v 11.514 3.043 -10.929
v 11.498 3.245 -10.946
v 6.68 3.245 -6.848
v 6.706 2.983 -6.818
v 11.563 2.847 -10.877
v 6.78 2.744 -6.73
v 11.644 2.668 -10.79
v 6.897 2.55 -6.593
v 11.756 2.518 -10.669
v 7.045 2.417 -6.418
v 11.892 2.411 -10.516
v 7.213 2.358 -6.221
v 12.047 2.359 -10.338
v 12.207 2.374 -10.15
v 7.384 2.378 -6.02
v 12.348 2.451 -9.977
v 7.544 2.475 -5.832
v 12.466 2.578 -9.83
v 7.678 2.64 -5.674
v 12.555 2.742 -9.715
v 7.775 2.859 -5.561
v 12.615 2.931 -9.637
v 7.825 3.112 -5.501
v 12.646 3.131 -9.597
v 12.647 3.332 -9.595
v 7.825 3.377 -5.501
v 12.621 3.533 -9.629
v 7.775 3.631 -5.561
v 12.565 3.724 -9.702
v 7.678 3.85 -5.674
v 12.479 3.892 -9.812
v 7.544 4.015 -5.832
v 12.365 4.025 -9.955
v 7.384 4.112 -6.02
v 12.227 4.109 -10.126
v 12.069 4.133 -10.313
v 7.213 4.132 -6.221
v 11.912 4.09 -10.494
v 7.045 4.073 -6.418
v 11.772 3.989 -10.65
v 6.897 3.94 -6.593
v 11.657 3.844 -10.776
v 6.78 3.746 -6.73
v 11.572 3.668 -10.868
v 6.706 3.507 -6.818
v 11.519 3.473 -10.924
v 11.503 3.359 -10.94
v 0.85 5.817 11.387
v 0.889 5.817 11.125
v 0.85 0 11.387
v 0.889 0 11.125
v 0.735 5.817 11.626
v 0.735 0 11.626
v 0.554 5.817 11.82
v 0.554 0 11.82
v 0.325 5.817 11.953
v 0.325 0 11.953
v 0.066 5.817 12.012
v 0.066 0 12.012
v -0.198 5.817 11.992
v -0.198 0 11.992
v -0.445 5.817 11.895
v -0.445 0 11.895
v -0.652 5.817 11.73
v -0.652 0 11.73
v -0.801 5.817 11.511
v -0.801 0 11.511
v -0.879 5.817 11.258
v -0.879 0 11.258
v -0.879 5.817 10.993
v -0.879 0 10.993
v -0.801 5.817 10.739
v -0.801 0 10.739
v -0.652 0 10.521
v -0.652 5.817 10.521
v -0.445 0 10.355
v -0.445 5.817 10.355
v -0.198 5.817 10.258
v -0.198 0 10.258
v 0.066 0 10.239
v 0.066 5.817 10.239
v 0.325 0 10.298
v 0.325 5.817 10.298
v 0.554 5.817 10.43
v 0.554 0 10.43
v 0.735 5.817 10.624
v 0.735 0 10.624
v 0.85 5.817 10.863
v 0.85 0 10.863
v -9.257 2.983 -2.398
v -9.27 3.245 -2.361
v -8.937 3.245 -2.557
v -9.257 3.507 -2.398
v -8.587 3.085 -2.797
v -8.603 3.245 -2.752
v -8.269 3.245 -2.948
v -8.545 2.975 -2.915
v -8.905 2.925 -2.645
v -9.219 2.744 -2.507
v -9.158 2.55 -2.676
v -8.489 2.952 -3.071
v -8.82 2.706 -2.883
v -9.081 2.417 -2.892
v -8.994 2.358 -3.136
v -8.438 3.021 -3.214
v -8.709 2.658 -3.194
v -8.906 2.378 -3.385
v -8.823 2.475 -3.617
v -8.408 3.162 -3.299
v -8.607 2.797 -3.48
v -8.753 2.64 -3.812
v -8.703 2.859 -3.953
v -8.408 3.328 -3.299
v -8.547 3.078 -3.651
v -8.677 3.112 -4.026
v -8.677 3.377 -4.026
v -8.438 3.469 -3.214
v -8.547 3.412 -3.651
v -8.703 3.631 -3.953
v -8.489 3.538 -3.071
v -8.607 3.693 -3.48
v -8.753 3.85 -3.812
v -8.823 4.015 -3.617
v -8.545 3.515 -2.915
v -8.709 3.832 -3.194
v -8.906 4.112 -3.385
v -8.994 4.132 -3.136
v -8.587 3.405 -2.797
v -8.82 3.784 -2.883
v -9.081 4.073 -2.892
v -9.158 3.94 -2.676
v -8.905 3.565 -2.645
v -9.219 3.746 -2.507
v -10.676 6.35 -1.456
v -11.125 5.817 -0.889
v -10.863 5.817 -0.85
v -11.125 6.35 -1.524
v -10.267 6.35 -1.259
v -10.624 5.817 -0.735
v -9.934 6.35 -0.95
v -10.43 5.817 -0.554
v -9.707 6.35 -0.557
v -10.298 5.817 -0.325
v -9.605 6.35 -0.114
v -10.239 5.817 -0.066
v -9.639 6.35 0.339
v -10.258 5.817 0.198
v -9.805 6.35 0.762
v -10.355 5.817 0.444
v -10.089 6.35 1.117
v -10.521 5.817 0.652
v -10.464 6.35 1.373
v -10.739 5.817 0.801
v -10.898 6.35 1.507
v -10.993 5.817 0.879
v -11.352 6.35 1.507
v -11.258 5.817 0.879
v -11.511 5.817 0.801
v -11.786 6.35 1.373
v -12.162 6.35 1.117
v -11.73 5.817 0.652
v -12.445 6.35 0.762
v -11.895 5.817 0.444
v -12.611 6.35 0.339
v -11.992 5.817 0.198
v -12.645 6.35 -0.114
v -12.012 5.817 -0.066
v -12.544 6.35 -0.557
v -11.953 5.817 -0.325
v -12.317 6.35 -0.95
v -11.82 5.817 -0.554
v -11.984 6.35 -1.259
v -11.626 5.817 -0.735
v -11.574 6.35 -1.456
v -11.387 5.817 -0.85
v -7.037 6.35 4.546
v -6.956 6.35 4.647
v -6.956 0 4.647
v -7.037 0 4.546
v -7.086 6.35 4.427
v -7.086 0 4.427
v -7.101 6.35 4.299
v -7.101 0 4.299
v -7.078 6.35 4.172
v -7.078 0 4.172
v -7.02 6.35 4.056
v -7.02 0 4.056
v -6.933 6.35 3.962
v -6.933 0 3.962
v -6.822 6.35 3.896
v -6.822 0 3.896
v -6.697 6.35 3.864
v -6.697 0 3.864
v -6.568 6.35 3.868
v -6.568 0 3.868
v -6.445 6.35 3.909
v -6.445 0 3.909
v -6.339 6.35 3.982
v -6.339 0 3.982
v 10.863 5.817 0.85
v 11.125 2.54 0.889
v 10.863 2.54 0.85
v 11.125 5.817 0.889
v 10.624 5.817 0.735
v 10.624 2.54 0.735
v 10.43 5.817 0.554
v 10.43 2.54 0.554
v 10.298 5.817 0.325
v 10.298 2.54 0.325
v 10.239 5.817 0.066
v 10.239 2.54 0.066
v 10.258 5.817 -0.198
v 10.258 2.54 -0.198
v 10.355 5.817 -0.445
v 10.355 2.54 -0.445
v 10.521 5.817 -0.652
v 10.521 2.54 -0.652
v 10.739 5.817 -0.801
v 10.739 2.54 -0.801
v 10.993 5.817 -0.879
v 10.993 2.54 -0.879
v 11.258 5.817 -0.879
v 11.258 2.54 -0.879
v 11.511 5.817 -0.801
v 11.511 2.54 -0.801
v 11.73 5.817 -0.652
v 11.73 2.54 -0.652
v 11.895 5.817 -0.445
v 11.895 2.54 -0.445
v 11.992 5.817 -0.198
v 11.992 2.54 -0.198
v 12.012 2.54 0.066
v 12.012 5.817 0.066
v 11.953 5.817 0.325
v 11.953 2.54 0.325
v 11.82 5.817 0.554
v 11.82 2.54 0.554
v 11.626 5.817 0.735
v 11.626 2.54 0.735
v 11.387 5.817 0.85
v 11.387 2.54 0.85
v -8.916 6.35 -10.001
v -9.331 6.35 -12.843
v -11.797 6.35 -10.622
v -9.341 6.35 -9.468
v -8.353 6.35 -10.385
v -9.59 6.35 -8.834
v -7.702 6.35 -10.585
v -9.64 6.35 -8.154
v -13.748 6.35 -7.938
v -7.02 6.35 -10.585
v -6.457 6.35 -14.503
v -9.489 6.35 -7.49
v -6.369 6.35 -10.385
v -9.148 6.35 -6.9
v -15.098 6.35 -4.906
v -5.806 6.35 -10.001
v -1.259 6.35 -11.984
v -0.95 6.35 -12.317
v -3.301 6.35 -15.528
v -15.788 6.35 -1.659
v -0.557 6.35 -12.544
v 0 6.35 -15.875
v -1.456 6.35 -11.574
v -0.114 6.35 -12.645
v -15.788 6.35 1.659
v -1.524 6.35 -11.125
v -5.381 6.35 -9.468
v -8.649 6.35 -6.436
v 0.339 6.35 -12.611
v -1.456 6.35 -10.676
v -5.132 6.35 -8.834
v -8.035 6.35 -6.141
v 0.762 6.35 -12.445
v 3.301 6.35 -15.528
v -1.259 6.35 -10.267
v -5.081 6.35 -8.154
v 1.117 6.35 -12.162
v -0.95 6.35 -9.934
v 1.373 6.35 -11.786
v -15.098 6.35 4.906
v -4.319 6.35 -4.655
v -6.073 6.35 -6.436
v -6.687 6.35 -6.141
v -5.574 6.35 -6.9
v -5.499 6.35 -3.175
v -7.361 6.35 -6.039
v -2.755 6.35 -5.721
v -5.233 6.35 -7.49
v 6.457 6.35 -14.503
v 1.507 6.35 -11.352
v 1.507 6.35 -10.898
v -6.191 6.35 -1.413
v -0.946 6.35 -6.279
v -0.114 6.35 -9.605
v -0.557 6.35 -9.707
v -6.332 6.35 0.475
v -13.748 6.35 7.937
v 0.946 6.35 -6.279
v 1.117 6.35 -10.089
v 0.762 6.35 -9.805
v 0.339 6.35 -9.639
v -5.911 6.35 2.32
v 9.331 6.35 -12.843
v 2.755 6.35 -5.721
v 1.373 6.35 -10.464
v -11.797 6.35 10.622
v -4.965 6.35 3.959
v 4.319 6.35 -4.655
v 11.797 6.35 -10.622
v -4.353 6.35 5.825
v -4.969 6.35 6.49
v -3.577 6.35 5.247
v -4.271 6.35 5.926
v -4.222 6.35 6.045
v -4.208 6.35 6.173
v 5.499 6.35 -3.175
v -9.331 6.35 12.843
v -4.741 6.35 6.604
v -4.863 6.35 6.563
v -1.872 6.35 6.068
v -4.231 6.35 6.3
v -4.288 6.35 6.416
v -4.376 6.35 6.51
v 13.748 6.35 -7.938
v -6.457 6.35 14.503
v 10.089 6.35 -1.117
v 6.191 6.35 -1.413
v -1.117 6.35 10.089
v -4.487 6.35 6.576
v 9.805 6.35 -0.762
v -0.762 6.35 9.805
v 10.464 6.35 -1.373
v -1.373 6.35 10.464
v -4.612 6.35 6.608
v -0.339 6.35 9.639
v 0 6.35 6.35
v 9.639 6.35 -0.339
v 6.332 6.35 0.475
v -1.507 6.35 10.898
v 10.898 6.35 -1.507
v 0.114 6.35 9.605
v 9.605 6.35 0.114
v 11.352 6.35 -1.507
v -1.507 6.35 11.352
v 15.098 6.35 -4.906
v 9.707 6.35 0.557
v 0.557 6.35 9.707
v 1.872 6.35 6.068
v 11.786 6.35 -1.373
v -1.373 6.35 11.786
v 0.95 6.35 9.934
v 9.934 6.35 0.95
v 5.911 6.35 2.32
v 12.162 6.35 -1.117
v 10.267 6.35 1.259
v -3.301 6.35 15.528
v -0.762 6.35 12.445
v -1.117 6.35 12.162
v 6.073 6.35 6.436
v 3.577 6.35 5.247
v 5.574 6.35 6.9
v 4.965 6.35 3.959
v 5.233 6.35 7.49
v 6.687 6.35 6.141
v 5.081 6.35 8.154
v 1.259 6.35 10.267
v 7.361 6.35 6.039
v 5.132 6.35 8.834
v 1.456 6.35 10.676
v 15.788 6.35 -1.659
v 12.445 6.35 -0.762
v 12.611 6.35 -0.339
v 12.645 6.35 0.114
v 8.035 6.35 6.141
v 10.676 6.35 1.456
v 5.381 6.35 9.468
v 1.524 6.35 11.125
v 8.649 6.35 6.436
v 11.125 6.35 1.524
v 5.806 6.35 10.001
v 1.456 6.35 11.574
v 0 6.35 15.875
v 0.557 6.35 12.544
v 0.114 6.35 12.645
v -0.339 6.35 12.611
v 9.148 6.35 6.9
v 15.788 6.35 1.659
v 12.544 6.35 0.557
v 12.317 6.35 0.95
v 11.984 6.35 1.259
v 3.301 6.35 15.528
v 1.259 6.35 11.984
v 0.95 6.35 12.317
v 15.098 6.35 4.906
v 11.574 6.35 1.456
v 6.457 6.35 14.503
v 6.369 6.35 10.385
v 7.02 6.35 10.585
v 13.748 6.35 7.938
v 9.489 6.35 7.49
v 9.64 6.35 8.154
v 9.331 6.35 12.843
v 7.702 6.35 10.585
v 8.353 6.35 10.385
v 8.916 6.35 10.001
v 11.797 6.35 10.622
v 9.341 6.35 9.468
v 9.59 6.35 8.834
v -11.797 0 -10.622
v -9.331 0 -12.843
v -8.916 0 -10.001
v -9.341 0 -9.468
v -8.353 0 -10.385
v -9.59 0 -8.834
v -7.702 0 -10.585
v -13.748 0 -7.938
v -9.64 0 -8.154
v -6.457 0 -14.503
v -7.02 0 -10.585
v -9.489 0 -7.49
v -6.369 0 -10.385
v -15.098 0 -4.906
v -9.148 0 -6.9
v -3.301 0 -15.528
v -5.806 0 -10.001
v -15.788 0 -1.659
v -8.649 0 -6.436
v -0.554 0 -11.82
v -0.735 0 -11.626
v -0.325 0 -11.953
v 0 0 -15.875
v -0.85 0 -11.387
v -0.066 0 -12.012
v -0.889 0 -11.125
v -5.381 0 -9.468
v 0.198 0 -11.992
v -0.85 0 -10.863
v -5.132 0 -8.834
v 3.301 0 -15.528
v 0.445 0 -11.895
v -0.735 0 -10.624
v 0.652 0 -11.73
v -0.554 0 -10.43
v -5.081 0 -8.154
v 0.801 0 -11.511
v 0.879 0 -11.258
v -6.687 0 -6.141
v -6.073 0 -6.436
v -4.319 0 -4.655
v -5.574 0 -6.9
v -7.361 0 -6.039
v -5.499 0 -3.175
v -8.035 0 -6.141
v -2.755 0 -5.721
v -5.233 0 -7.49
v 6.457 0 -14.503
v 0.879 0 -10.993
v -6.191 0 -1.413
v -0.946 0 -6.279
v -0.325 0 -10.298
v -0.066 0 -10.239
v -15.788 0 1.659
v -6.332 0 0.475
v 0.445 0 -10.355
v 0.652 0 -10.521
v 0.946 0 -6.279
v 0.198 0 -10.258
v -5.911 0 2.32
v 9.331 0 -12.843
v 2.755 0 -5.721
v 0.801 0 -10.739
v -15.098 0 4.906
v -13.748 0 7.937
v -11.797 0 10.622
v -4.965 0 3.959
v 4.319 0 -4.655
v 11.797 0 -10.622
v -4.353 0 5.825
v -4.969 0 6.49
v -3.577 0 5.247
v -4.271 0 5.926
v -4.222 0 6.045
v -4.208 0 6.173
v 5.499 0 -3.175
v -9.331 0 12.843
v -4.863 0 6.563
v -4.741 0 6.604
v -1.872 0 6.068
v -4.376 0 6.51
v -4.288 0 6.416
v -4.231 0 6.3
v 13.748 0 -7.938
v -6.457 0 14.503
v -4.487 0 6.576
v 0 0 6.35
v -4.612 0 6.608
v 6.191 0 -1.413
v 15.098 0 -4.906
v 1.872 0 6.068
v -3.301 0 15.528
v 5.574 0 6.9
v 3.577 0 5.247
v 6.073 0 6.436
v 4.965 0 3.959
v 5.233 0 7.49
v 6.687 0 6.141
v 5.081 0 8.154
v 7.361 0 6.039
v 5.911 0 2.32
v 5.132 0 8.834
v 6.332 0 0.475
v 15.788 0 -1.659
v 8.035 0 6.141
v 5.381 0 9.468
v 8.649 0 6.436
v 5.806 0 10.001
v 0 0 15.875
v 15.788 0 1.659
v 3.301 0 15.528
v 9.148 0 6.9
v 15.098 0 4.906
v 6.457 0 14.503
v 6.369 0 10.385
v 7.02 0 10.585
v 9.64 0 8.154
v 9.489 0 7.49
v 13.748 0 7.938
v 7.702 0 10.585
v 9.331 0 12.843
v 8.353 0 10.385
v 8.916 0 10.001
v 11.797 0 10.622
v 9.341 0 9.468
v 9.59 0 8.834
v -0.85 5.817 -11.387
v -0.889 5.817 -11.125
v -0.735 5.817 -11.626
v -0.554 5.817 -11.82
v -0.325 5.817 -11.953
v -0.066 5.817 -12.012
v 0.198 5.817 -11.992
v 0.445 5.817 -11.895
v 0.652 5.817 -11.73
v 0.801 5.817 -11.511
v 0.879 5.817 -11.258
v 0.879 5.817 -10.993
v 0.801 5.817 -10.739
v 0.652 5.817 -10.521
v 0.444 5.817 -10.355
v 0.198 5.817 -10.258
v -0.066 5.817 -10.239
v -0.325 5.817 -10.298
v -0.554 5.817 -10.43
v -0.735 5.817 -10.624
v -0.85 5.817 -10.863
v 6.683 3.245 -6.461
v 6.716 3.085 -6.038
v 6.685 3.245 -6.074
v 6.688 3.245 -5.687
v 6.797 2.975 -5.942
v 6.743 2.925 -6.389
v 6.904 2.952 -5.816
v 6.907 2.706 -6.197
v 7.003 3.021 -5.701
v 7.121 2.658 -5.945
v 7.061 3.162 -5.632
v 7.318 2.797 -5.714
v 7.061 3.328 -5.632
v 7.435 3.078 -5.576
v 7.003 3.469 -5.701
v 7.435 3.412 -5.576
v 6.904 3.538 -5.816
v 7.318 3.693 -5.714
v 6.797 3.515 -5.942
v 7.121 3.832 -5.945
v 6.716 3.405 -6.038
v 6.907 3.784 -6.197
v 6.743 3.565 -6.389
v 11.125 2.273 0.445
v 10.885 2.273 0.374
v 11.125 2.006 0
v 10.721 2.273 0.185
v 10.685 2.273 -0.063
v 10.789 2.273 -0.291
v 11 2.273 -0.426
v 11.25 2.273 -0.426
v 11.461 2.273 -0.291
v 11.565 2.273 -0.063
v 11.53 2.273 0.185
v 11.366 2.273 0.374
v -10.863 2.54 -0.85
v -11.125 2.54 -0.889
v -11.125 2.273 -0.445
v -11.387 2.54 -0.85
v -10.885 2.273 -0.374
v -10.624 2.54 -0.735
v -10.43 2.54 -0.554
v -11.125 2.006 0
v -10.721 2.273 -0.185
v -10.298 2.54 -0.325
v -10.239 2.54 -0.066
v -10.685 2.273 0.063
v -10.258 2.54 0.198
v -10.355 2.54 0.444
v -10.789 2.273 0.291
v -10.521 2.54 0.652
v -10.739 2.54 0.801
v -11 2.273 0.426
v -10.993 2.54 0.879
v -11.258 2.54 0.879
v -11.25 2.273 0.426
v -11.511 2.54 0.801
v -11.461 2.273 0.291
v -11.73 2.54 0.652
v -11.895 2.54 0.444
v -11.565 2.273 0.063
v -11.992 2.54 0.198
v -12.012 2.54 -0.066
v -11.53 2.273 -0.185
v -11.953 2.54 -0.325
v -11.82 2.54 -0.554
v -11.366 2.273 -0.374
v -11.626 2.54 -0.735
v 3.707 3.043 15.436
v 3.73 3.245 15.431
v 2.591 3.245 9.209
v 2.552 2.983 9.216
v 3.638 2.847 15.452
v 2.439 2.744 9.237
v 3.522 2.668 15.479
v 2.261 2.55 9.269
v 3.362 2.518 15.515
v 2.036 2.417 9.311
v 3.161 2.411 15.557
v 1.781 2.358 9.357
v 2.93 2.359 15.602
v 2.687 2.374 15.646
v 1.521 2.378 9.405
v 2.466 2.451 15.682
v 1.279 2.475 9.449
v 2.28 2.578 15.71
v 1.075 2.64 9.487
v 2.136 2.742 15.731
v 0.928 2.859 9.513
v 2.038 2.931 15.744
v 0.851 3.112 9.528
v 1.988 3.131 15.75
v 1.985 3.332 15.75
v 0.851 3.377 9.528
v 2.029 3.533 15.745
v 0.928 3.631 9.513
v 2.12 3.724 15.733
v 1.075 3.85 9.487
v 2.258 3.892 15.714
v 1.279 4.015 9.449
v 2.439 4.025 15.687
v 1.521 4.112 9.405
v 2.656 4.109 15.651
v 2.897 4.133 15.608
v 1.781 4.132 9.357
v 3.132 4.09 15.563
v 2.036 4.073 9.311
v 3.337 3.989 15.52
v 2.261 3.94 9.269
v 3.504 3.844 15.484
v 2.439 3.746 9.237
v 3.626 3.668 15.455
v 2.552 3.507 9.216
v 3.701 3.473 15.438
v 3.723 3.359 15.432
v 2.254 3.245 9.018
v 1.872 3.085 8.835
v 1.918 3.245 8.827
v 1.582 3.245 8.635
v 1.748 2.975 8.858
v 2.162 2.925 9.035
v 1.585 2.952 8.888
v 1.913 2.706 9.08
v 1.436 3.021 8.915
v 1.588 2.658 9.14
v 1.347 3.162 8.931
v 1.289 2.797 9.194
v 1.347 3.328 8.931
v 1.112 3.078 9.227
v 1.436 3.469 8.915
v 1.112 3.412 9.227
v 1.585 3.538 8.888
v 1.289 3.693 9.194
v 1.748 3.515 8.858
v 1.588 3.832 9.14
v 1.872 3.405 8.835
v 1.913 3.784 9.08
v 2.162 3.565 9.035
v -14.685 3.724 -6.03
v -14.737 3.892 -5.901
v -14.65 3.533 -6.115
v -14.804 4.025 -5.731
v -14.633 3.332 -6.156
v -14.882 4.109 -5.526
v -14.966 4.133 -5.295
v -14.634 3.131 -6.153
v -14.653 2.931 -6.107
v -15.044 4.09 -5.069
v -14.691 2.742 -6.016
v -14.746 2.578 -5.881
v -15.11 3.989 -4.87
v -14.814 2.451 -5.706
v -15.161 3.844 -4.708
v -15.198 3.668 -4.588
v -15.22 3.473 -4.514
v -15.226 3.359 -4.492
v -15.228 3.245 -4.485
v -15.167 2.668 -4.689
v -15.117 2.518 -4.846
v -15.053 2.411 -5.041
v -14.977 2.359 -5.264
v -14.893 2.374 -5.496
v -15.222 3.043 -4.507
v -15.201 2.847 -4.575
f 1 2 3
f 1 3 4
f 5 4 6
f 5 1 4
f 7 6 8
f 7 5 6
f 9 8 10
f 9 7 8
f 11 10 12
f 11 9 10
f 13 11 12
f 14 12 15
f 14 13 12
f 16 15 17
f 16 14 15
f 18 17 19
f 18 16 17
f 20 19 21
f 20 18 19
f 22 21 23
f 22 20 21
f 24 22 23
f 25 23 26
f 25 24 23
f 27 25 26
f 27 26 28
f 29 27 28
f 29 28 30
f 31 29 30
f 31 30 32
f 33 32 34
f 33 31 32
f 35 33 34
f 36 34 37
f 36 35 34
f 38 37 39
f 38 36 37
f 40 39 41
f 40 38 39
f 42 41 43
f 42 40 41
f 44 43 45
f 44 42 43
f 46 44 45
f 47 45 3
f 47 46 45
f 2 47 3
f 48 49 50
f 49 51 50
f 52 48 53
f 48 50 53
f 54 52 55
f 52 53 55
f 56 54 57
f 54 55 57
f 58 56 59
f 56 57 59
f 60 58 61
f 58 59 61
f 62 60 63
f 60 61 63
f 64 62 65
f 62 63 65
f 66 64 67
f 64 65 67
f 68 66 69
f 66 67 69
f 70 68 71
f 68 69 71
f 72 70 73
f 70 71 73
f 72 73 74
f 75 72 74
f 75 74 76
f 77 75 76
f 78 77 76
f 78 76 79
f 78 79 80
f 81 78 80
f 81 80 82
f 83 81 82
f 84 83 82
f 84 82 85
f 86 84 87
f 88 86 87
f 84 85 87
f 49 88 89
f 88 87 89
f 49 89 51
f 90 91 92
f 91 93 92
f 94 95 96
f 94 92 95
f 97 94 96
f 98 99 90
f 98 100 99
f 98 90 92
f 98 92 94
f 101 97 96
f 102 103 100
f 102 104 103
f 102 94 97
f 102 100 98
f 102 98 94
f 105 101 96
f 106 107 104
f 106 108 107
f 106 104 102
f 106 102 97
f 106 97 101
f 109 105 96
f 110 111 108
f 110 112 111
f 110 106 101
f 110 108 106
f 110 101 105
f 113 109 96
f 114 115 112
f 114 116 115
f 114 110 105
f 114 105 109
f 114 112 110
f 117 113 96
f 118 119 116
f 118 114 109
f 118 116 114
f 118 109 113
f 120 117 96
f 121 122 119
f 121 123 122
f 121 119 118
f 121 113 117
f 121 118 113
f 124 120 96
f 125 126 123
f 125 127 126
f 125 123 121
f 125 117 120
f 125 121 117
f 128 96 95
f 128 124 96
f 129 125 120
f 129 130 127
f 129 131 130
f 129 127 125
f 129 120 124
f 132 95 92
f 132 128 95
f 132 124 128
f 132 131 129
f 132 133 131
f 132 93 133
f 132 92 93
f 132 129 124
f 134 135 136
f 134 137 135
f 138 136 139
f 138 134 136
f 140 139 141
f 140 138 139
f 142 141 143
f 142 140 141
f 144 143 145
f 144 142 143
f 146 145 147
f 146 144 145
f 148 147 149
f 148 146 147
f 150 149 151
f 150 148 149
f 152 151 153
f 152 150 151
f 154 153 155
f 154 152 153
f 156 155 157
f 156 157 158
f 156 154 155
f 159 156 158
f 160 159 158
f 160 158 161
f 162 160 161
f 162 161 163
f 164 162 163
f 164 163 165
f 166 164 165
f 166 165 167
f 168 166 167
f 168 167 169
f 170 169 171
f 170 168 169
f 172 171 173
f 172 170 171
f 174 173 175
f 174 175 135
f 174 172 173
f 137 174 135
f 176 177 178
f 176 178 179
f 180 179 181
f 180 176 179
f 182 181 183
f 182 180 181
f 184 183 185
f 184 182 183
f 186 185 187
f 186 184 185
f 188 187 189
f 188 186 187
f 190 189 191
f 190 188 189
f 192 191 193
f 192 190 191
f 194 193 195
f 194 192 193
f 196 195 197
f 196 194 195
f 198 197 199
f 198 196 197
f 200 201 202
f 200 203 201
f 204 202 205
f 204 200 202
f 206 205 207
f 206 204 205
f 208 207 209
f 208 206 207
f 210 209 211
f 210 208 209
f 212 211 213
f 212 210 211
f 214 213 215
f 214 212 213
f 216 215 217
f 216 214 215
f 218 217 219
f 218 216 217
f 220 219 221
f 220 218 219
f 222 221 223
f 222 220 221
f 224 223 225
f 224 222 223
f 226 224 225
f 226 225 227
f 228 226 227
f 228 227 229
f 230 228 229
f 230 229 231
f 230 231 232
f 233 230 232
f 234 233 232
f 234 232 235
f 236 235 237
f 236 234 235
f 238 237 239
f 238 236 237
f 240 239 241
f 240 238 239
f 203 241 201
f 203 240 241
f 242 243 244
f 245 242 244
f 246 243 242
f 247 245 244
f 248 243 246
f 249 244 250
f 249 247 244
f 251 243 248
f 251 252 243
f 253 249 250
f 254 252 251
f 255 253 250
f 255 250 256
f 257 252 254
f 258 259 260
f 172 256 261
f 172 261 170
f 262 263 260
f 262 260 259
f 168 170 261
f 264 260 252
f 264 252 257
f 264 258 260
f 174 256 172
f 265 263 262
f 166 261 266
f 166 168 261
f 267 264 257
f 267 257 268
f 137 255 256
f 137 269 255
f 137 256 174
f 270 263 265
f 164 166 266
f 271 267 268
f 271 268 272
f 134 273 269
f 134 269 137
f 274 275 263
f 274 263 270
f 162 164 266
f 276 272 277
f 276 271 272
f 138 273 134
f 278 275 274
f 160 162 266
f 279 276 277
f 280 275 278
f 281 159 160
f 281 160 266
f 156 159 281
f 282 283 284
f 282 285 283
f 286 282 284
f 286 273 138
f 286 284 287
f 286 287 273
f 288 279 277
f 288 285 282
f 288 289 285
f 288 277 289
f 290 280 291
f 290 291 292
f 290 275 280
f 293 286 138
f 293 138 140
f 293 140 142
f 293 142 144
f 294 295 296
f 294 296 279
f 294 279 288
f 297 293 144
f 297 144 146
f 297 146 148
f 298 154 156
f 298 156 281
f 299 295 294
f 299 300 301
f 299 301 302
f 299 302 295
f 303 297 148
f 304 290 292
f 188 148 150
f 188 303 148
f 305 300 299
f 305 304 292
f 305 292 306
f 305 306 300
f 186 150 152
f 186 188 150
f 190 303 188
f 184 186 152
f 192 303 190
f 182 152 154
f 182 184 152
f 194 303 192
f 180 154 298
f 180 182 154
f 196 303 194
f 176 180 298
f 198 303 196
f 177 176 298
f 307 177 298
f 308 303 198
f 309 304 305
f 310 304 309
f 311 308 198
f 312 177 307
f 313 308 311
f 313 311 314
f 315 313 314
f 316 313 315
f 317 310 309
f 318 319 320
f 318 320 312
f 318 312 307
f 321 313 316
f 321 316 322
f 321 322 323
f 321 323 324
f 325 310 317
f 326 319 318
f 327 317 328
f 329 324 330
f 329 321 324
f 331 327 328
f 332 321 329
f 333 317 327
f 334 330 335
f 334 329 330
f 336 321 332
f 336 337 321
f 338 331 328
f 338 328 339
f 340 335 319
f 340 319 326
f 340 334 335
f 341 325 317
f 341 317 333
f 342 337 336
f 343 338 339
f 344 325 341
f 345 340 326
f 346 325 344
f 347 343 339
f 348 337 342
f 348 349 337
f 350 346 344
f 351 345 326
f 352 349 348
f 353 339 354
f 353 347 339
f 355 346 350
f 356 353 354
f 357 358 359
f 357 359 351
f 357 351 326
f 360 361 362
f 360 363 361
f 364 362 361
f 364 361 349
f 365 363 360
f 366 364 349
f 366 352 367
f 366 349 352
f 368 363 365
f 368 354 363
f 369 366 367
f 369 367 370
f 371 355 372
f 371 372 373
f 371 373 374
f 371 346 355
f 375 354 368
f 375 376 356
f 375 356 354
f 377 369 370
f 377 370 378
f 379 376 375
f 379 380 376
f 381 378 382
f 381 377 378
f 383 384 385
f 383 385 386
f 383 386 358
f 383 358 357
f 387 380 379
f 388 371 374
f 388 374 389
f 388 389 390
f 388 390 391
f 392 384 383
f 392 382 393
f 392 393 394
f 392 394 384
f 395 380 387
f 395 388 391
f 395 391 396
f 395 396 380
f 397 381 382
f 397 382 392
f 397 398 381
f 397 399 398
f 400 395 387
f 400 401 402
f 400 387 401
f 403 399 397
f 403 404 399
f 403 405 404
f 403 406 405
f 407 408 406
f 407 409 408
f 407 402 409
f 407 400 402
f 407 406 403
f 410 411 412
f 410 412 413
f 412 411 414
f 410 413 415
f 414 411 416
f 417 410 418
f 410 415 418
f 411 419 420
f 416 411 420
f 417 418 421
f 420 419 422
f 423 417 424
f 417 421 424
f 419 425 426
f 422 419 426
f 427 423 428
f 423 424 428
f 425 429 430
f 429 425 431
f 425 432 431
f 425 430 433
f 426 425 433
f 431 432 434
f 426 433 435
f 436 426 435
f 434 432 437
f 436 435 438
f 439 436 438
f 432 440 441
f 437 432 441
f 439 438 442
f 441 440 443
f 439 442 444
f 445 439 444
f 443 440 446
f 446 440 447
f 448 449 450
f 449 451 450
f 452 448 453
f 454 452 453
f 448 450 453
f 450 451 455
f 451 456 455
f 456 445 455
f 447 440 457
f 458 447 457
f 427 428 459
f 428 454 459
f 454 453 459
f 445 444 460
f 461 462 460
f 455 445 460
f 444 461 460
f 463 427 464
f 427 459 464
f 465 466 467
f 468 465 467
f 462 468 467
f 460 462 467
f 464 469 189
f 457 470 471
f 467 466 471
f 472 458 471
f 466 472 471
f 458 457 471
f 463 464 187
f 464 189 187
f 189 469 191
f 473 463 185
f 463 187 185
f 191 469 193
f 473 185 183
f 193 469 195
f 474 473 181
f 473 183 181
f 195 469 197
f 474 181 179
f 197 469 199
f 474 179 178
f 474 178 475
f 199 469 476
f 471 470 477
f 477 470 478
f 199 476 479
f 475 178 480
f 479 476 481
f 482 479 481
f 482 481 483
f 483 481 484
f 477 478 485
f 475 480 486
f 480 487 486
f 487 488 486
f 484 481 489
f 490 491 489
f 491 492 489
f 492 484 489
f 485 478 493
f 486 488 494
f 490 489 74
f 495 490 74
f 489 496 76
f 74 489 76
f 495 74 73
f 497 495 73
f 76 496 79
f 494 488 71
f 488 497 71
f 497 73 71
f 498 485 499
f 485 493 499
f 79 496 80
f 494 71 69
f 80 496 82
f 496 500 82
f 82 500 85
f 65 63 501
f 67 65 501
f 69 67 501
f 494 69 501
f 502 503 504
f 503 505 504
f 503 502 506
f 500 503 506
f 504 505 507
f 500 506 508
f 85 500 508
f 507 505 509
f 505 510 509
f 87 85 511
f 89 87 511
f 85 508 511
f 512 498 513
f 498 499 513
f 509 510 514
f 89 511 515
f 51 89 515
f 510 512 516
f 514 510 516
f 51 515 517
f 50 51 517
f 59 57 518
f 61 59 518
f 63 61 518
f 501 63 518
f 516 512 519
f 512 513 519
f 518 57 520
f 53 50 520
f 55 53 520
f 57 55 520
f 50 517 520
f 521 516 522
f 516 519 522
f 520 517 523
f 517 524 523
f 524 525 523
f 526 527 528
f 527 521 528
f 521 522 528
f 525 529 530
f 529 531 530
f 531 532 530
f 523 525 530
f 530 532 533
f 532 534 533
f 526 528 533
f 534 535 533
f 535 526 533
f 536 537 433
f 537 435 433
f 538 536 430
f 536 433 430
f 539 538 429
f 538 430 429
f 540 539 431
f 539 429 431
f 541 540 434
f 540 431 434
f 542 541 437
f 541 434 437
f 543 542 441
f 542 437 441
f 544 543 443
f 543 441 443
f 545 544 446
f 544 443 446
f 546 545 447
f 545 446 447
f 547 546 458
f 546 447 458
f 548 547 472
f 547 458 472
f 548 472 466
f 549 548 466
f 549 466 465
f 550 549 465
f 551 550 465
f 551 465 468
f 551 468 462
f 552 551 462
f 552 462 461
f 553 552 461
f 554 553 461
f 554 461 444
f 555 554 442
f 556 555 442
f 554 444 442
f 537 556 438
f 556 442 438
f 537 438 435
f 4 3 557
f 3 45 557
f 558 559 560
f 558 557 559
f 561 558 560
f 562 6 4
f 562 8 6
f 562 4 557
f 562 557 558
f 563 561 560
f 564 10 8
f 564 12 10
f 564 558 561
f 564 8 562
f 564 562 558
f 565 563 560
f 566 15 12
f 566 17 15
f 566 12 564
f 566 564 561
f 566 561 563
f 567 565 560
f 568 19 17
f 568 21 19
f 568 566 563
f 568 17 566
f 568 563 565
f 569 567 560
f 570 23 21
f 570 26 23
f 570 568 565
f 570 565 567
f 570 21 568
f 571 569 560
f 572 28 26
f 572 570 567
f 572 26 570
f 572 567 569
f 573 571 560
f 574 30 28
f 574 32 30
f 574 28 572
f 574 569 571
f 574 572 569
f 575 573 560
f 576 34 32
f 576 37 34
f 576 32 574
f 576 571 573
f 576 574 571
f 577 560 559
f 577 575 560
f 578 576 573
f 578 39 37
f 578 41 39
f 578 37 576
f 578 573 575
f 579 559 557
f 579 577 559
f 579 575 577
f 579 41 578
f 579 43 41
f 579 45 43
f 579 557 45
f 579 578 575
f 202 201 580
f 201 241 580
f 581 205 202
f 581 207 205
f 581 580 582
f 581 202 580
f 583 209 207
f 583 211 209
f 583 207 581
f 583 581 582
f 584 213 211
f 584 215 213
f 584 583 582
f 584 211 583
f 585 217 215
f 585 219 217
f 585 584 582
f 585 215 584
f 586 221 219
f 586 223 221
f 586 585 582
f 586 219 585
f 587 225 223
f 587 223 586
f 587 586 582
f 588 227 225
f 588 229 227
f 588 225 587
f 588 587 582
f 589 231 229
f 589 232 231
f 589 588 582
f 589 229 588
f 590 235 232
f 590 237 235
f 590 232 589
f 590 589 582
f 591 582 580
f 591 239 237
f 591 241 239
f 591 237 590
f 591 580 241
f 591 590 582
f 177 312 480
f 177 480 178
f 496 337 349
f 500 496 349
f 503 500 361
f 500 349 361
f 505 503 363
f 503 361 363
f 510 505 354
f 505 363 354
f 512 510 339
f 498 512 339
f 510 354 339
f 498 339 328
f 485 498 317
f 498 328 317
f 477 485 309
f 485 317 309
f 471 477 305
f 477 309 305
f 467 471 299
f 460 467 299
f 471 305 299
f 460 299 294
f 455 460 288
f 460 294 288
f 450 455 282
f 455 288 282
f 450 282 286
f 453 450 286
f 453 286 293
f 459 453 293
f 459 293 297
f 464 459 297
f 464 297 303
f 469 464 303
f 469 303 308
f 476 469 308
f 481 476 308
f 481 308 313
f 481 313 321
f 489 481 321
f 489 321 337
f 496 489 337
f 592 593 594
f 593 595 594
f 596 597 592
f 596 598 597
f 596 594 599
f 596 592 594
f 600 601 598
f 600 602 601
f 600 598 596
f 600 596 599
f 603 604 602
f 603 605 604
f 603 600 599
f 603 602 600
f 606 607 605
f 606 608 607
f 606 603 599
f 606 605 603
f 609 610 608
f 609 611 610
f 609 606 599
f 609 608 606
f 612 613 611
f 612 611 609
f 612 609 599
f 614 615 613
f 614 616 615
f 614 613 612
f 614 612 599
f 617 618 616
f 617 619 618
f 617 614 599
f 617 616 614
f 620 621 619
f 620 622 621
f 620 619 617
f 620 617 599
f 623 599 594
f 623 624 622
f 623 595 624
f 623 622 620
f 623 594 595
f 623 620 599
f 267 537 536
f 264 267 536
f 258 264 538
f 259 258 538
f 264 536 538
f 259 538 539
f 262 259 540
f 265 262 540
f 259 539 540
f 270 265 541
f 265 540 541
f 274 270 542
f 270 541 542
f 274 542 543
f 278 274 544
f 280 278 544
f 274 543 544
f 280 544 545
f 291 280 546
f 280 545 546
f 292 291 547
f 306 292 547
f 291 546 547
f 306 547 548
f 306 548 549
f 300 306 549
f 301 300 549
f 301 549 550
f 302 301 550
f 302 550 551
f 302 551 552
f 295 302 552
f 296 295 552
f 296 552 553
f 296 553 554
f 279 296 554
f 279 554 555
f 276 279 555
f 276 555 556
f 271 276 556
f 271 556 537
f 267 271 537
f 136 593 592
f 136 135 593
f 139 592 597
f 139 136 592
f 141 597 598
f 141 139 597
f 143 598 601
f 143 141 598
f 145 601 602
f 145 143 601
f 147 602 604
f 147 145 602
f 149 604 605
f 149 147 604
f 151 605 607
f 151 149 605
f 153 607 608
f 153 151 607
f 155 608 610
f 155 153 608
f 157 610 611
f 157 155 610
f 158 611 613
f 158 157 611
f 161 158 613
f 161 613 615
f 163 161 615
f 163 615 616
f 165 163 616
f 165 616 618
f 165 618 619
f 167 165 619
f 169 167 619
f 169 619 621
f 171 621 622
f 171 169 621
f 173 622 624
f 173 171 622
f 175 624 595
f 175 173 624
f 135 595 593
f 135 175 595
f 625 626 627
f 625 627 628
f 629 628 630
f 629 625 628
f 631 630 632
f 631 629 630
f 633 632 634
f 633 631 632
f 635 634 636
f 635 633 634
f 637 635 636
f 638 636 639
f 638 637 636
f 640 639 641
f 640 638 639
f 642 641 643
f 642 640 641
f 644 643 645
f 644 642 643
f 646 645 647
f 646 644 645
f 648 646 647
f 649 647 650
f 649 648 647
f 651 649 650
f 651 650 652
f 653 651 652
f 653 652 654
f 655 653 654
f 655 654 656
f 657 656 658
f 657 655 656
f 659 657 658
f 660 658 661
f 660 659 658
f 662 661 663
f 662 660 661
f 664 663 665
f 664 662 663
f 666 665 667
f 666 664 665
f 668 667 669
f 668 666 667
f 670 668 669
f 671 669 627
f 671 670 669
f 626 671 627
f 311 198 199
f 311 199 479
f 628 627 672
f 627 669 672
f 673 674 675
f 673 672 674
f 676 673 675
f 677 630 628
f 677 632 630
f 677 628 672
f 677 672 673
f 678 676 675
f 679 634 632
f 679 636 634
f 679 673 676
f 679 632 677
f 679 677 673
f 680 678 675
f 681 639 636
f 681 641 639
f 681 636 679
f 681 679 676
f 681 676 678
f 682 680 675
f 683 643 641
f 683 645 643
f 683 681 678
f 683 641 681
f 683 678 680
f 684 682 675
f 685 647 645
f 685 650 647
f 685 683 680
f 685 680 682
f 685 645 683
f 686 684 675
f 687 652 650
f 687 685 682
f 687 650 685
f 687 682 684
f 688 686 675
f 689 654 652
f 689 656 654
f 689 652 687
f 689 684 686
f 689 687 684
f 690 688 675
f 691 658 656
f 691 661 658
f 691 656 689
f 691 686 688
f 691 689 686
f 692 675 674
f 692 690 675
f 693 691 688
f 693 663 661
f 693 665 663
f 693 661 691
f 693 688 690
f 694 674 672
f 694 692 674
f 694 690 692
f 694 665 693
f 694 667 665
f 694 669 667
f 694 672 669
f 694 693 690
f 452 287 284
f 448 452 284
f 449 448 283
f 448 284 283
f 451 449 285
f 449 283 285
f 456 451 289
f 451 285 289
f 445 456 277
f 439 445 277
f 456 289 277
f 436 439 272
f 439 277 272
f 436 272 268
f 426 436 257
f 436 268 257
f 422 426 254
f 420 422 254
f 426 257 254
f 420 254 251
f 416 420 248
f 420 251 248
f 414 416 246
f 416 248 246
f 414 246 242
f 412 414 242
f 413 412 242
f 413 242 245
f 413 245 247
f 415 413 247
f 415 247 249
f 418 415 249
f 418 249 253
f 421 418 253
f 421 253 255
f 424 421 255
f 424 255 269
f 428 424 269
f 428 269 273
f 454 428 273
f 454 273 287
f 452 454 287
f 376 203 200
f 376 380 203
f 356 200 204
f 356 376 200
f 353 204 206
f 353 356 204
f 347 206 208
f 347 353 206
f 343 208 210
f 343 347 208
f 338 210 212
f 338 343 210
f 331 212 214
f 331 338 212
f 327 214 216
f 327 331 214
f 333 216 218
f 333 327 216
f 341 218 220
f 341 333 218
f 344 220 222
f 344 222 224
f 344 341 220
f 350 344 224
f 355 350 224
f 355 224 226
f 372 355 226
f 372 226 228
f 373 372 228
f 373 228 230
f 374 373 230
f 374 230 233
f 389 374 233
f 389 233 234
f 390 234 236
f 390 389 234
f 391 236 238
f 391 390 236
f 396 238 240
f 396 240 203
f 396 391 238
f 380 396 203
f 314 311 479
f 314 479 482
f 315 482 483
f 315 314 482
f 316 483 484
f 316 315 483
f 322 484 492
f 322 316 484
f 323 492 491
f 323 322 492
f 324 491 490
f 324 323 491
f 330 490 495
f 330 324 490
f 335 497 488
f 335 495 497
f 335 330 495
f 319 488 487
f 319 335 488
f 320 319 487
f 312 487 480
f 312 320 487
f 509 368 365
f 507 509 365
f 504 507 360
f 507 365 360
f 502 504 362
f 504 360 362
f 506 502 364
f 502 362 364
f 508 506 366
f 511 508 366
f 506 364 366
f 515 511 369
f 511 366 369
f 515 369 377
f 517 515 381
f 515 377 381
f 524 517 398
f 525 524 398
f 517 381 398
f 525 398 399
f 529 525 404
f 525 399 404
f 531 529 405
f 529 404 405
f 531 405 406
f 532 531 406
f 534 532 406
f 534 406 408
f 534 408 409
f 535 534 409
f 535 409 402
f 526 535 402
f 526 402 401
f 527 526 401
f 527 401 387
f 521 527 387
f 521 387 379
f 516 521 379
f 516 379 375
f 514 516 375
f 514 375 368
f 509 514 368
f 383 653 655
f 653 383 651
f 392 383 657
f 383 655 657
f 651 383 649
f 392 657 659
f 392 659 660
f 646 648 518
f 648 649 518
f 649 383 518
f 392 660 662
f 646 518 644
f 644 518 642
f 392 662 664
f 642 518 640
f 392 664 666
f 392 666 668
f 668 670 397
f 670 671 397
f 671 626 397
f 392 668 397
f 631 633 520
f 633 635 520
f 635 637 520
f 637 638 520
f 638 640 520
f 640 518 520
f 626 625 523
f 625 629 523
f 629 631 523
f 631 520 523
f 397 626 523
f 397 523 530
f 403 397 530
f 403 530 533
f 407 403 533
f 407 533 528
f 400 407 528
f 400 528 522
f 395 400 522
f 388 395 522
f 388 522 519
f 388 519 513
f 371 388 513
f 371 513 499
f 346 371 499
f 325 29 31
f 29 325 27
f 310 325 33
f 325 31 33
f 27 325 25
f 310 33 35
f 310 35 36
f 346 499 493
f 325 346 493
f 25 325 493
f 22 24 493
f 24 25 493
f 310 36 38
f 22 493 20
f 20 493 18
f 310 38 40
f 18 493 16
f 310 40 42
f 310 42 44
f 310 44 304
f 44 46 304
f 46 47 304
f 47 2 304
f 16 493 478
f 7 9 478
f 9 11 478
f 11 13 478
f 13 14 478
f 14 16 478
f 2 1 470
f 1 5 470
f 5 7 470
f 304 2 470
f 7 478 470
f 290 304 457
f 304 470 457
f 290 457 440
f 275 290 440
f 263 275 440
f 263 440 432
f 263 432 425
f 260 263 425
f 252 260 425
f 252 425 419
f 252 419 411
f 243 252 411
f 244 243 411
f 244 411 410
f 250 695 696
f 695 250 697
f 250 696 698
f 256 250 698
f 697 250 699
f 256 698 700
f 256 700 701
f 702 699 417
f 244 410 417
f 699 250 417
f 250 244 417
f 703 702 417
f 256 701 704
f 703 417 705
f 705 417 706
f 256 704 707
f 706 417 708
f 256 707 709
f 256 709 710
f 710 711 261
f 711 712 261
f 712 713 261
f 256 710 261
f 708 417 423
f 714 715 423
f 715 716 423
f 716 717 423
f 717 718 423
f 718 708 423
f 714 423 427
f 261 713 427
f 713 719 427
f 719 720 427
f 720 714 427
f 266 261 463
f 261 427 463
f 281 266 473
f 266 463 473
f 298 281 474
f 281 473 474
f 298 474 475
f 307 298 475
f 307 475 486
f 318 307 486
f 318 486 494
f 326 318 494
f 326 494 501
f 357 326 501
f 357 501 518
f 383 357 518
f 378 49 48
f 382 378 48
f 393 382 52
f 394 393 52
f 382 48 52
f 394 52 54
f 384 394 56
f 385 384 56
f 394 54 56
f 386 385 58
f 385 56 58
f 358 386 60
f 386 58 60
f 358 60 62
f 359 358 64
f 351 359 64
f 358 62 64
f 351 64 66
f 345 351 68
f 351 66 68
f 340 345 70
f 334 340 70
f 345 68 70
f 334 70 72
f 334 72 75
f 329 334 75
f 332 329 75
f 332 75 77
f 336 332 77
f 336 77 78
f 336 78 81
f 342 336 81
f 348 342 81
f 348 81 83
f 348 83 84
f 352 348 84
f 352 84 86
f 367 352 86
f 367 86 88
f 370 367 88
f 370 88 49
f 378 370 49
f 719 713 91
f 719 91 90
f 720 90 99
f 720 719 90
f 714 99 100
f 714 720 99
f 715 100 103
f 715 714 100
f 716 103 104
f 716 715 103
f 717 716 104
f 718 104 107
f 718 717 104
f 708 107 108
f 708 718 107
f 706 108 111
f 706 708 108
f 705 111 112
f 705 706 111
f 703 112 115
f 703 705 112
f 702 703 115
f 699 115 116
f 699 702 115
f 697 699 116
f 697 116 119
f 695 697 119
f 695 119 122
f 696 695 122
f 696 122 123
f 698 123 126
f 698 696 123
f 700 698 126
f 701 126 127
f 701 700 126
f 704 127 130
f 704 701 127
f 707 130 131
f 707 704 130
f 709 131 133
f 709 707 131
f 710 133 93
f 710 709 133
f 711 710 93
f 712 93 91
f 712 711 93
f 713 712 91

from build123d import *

# Parameters (mm, degrees)
SKETCH1_R                           = 15.875
BOSS_EXTRUDE1_DEPTH                 = 6.35
SKETCH2_R                           = 6.35
CUT_EXTRUDE1_DEPTH                  = 24.3313898
TAP_DRILL_FOR_2_56_TAP2_D           = 1.778
TAP_DRILL_FOR_2_56_TAP2_CSINK_D     = 3.048
TAP_DRILL_FOR_2_56_TAP2_CSINK_ANGLE = 100
CIRPATTERN1_COUNT                   = 2
CIRPATTERN2_COUNT                   = 2
SKETCH11_R                          = 2.286
CUT_EXTRUDE2_DEPTH                  = 24.3313898
CIRPATTERN3_COUNT                   = 2
CIRPATTERN4_COUNT                   = 3
CUT_EXTRUDE3_DEPTH                  = 24.331389963


with BuildPart() as part:
    # Sketch1 → Boss-Extrude1 (new body)
    with BuildSketch(Plane(origin=(0, 0, 0), x_dir=(1, 0, 0), z_dir=(0, 1, 0))):
        with Locations(Location((0, 0, 0), (0, 0, 270))):
            Circle(SKETCH1_R)
    extrude(amount=BOSS_EXTRUDE1_DEPTH)

    # Sketch2 → Cut-Extrude1 (cut, through all)
    with BuildSketch(Plane(origin=(0, 6.35, 0), x_dir=(1, 0, 0), z_dir=(0, 1, 0))):
        with Locations(Location((0, 0, 0), (0, 0, 270))):
            Circle(SKETCH2_R)
    extrude(amount=-CUT_EXTRUDE1_DEPTH, mode=Mode.SUBTRACT)

    # Tap Drill for #2-56 Tap2 (through all)
    with Locations(Plane(origin=(0, 6.35, 0), x_dir=(1, 0, 0), z_dir=(0, 1, 0))):
        with Locations((0, 11.1252)):
            tap_drill_for_2_56_tap2 = CounterSinkHole(TAP_DRILL_FOR_2_56_TAP2_D / 2, TAP_DRILL_FOR_2_56_TAP2_CSINK_D / 2, counter_sink_angle=TAP_DRILL_FOR_2_56_TAP2_CSINK_ANGLE)

    # CirPattern1: Tap Drill for #2-56 Tap2 ×2 about axis
    cirpattern1_axis = Axis((0, 0, 0), (0, 1, 0))
    for i in range(1, CIRPATTERN1_COUNT):
        add(tap_drill_for_2_56_tap2.rotate(cirpattern1_axis, i * 360 / CIRPATTERN1_COUNT), mode=Mode.SUBTRACT)

    # Sketch10 → Tap Drill for #2-56 Tap1 (revolve, cut)
    with BuildSketch(Plane(origin=(11.1252, 6.35, 0), x_dir=(0, 0, 1), z_dir=(1, 0, 0))):
        Polygon((0, 0), (0, 4.34416509), (0.889, 3.81), (0.889, 0.532828266), (1.524, 0), align=None)
    tap_drill_for_2_56_tap1 = revolve(axis=Axis((11.1252, 12.7, 0), (0, -1, 0)), mode=Mode.SUBTRACT)

    # CirPattern2: Tap Drill for #2-56 Tap1 ×2 about axis
    cirpattern2_axis = Axis((0, 0, 0), (0, 1, 0))
    for i in range(1, CIRPATTERN2_COUNT):
        add(tap_drill_for_2_56_tap1.rotate(cirpattern2_axis, i * 360 / CIRPATTERN2_COUNT), mode=Mode.SUBTRACT)

    # Sketch11 → Cut-Extrude2 (cut, through all)
    with BuildSketch(Plane(origin=(0, 6.35, 0), x_dir=(1, 0, 0), z_dir=(0, 1, 0))):
        with Locations(Location((-7.360856908, 8.324988999, 0), (0, 0, 270))):
            Circle(SKETCH11_R)
    cut_extrude2 = extrude(amount=-CUT_EXTRUDE2_DEPTH, mode=Mode.SUBTRACT)

    # CirPattern3: Cut-Extrude2 ×2 about axis
    cirpattern3_axis = Axis((0, 0, 0), (0, 1, 0))
    for i in range(1, CIRPATTERN3_COUNT):
        add(cut_extrude2.rotate(cirpattern3_axis, i * 360 / CIRPATTERN3_COUNT), mode=Mode.SUBTRACT)

    # Sketch16 → Tap Drill for #2-56 Tap3 (revolve, cut)
    with BuildSketch(Plane(origin=(12.093135875, 3.244987275, -10.284536436), x_dir=(-0.6478448148472237, 0, -0.7617723386127685), z_dir=(0, 1, 0))):
        Polygon((0, 0), (0, 7.095959572), (0.889, 6.35), (0.889, 0), align=None)
    tap_drill_for_2_56_tap3 = revolve(axis=Axis((16.930390226, 3.244987275, -14.39835101), (-0.7617723386127686, 0, 0.6478448148472237)), mode=Mode.SUBTRACT)

    # CirPattern4: Tap Drill for #2-56 Tap3 ×3 about axis
    cirpattern4_axis = Axis((0, 6.35, 0), (0, -1, 0))
    for i in range(1, CIRPATTERN4_COUNT):
        add(tap_drill_for_2_56_tap3.rotate(cirpattern4_axis, i * 360 / CIRPATTERN4_COUNT), mode=Mode.SUBTRACT)

    # Sketch17 → Cut-Extrude3 (cut, through all)
    with BuildSketch(Plane(origin=(0, 6.35, 0), x_dir=(1, 0, 0), z_dir=(0, 1, 0))):
        with BuildLine():
            Line((-4.96914615, -6.489934512), (-6.955810814, -4.646503161))
            ThreePointArc((-6.955810814, -4.646503161), (-6.979764598, -4.005972756), (-6.339234193, -3.982018972))
            Line((-6.339234193, -3.982018972), (-4.352569529, -5.825450323))
            ThreePointArc((-4.352569529, -5.825450323), (-4.328615745, -6.465980728), (-4.96914615, -6.489934512))
        make_face()
    extrude(amount=-CUT_EXTRUDE3_DEPTH, mode=Mode.SUBTRACT)


solid = part.part
